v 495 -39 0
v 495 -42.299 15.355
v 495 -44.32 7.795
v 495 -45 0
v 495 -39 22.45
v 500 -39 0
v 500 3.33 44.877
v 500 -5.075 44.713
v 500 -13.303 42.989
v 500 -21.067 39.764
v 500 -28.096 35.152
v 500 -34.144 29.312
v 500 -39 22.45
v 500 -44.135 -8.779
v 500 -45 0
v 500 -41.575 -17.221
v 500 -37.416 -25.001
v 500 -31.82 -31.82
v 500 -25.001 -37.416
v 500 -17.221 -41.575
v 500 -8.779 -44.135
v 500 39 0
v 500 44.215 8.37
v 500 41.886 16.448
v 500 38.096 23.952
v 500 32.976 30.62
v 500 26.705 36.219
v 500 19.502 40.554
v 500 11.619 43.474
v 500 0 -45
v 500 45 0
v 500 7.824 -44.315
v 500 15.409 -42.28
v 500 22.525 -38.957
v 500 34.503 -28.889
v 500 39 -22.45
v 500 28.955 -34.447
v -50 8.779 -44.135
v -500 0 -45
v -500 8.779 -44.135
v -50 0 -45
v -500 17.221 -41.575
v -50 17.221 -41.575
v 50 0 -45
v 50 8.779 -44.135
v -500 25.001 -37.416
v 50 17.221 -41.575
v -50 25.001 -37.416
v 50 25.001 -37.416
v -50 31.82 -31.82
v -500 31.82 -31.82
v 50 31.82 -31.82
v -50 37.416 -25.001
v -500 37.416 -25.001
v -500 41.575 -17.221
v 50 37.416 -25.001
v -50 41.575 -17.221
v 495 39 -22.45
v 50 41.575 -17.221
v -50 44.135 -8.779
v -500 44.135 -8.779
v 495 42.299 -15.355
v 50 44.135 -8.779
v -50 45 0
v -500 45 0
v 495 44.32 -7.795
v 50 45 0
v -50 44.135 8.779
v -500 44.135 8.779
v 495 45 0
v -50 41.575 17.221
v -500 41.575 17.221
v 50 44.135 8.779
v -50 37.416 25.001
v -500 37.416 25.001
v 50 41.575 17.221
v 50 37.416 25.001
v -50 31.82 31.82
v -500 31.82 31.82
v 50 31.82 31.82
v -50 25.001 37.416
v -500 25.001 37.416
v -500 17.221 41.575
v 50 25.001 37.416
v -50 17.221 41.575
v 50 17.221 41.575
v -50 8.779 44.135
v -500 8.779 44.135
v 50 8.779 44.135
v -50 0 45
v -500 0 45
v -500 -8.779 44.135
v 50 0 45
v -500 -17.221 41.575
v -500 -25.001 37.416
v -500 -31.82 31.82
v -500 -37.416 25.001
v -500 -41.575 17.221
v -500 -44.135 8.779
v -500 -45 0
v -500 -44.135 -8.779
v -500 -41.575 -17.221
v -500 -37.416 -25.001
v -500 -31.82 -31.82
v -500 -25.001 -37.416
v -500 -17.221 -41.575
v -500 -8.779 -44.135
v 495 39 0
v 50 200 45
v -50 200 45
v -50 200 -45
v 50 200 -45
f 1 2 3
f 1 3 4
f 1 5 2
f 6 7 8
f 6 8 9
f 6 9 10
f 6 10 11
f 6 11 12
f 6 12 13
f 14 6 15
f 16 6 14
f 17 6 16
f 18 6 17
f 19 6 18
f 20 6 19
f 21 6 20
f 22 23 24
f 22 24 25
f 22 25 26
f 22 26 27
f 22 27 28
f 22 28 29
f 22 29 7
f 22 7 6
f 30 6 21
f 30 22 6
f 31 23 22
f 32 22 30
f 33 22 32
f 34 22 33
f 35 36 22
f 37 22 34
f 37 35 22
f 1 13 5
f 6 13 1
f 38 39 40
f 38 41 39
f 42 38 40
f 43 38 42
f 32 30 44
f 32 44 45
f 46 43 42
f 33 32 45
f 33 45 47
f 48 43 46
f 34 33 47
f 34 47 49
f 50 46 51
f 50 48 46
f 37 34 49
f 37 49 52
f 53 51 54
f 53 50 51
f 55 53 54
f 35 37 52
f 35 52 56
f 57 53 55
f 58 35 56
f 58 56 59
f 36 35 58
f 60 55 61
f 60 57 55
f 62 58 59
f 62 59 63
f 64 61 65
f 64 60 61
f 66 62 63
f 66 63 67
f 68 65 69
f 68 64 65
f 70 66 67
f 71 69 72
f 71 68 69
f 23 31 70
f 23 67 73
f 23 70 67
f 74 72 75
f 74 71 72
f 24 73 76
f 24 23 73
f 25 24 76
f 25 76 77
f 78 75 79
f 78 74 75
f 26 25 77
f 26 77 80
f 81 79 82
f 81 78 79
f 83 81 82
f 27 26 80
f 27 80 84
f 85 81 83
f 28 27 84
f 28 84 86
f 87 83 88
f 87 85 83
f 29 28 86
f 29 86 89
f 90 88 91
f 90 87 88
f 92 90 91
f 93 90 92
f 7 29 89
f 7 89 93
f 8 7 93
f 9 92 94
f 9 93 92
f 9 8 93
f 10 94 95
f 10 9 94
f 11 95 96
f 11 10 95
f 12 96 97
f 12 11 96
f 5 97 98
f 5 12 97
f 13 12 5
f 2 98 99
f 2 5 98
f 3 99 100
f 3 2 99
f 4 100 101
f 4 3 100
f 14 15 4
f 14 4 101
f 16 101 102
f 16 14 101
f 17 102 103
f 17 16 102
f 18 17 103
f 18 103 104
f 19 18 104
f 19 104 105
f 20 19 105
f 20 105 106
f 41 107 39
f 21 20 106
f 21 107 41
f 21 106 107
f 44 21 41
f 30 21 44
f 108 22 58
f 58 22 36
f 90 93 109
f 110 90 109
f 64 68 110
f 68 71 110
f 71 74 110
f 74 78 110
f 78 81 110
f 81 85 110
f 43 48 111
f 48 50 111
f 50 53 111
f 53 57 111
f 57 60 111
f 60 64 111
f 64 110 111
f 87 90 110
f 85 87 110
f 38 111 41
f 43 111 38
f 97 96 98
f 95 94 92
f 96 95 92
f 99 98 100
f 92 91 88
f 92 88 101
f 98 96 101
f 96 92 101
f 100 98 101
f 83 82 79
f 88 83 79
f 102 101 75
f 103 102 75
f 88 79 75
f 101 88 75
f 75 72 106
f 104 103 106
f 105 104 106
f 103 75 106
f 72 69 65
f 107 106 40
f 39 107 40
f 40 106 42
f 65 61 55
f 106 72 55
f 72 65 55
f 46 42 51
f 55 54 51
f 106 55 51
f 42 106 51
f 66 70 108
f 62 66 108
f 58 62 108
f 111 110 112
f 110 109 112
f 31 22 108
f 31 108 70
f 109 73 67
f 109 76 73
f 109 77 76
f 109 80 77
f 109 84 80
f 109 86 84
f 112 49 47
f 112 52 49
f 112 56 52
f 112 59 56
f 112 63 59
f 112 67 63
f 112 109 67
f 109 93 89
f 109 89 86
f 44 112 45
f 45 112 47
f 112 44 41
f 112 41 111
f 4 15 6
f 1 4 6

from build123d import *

# Parameters (mm, degrees)
ESQUISSE1_R             = 45
BOSS_EXTRU_1_DEPTH      = 500
ESQUISSE2_W             = 90
ESQUISSE2_H             = 200
BOSS_EXTRU_2_DEPTH      = 50
ESQUISSE7_W             = 22.449944321
ESQUISSE7_H             = 6
ENL_V_MAT_EXTRU_1_DEPTH = 5


with BuildPart() as part:
    # Esquisse1 → Boss.-Extru.1 (new body, symmetric)
    with BuildSketch(Plane(origin=(0, 0, 0), x_dir=(0, 0, -1), z_dir=(1, 0, 0))):
        Circle(ESQUISSE1_R)
    extrude(amount=BOSS_EXTRU_1_DEPTH, both=True)

    # Esquisse2 → Boss.-Extru.2 (add, symmetric)
    with BuildSketch(Plane(origin=(0, 0, 0), x_dir=(0, 0, -1), z_dir=(1, 0, 0))):
        with Locations((0, 100)):
            Rectangle(ESQUISSE2_W, ESQUISSE2_H)
    extrude(amount=BOSS_EXTRU_2_DEPTH, both=True)

    # Esquisse7 → Enlèv. mat.-Extru.1 (cut)
    with BuildSketch(Plane(origin=(500, 0, 0), x_dir=(0, 0, -1), z_dir=(1, 0, 0))):
        with Locations((11.224972161, 42)):
            Rectangle(ESQUISSE7_W, ESQUISSE7_H)
        with Locations((-11.224972161, -42)):
            Rectangle(ESQUISSE7_W, ESQUISSE7_H)
    extrude(amount=-ENL_V_MAT_EXTRU_1_DEPTH, mode=Mode.SUBTRACT)


solid = part.part
